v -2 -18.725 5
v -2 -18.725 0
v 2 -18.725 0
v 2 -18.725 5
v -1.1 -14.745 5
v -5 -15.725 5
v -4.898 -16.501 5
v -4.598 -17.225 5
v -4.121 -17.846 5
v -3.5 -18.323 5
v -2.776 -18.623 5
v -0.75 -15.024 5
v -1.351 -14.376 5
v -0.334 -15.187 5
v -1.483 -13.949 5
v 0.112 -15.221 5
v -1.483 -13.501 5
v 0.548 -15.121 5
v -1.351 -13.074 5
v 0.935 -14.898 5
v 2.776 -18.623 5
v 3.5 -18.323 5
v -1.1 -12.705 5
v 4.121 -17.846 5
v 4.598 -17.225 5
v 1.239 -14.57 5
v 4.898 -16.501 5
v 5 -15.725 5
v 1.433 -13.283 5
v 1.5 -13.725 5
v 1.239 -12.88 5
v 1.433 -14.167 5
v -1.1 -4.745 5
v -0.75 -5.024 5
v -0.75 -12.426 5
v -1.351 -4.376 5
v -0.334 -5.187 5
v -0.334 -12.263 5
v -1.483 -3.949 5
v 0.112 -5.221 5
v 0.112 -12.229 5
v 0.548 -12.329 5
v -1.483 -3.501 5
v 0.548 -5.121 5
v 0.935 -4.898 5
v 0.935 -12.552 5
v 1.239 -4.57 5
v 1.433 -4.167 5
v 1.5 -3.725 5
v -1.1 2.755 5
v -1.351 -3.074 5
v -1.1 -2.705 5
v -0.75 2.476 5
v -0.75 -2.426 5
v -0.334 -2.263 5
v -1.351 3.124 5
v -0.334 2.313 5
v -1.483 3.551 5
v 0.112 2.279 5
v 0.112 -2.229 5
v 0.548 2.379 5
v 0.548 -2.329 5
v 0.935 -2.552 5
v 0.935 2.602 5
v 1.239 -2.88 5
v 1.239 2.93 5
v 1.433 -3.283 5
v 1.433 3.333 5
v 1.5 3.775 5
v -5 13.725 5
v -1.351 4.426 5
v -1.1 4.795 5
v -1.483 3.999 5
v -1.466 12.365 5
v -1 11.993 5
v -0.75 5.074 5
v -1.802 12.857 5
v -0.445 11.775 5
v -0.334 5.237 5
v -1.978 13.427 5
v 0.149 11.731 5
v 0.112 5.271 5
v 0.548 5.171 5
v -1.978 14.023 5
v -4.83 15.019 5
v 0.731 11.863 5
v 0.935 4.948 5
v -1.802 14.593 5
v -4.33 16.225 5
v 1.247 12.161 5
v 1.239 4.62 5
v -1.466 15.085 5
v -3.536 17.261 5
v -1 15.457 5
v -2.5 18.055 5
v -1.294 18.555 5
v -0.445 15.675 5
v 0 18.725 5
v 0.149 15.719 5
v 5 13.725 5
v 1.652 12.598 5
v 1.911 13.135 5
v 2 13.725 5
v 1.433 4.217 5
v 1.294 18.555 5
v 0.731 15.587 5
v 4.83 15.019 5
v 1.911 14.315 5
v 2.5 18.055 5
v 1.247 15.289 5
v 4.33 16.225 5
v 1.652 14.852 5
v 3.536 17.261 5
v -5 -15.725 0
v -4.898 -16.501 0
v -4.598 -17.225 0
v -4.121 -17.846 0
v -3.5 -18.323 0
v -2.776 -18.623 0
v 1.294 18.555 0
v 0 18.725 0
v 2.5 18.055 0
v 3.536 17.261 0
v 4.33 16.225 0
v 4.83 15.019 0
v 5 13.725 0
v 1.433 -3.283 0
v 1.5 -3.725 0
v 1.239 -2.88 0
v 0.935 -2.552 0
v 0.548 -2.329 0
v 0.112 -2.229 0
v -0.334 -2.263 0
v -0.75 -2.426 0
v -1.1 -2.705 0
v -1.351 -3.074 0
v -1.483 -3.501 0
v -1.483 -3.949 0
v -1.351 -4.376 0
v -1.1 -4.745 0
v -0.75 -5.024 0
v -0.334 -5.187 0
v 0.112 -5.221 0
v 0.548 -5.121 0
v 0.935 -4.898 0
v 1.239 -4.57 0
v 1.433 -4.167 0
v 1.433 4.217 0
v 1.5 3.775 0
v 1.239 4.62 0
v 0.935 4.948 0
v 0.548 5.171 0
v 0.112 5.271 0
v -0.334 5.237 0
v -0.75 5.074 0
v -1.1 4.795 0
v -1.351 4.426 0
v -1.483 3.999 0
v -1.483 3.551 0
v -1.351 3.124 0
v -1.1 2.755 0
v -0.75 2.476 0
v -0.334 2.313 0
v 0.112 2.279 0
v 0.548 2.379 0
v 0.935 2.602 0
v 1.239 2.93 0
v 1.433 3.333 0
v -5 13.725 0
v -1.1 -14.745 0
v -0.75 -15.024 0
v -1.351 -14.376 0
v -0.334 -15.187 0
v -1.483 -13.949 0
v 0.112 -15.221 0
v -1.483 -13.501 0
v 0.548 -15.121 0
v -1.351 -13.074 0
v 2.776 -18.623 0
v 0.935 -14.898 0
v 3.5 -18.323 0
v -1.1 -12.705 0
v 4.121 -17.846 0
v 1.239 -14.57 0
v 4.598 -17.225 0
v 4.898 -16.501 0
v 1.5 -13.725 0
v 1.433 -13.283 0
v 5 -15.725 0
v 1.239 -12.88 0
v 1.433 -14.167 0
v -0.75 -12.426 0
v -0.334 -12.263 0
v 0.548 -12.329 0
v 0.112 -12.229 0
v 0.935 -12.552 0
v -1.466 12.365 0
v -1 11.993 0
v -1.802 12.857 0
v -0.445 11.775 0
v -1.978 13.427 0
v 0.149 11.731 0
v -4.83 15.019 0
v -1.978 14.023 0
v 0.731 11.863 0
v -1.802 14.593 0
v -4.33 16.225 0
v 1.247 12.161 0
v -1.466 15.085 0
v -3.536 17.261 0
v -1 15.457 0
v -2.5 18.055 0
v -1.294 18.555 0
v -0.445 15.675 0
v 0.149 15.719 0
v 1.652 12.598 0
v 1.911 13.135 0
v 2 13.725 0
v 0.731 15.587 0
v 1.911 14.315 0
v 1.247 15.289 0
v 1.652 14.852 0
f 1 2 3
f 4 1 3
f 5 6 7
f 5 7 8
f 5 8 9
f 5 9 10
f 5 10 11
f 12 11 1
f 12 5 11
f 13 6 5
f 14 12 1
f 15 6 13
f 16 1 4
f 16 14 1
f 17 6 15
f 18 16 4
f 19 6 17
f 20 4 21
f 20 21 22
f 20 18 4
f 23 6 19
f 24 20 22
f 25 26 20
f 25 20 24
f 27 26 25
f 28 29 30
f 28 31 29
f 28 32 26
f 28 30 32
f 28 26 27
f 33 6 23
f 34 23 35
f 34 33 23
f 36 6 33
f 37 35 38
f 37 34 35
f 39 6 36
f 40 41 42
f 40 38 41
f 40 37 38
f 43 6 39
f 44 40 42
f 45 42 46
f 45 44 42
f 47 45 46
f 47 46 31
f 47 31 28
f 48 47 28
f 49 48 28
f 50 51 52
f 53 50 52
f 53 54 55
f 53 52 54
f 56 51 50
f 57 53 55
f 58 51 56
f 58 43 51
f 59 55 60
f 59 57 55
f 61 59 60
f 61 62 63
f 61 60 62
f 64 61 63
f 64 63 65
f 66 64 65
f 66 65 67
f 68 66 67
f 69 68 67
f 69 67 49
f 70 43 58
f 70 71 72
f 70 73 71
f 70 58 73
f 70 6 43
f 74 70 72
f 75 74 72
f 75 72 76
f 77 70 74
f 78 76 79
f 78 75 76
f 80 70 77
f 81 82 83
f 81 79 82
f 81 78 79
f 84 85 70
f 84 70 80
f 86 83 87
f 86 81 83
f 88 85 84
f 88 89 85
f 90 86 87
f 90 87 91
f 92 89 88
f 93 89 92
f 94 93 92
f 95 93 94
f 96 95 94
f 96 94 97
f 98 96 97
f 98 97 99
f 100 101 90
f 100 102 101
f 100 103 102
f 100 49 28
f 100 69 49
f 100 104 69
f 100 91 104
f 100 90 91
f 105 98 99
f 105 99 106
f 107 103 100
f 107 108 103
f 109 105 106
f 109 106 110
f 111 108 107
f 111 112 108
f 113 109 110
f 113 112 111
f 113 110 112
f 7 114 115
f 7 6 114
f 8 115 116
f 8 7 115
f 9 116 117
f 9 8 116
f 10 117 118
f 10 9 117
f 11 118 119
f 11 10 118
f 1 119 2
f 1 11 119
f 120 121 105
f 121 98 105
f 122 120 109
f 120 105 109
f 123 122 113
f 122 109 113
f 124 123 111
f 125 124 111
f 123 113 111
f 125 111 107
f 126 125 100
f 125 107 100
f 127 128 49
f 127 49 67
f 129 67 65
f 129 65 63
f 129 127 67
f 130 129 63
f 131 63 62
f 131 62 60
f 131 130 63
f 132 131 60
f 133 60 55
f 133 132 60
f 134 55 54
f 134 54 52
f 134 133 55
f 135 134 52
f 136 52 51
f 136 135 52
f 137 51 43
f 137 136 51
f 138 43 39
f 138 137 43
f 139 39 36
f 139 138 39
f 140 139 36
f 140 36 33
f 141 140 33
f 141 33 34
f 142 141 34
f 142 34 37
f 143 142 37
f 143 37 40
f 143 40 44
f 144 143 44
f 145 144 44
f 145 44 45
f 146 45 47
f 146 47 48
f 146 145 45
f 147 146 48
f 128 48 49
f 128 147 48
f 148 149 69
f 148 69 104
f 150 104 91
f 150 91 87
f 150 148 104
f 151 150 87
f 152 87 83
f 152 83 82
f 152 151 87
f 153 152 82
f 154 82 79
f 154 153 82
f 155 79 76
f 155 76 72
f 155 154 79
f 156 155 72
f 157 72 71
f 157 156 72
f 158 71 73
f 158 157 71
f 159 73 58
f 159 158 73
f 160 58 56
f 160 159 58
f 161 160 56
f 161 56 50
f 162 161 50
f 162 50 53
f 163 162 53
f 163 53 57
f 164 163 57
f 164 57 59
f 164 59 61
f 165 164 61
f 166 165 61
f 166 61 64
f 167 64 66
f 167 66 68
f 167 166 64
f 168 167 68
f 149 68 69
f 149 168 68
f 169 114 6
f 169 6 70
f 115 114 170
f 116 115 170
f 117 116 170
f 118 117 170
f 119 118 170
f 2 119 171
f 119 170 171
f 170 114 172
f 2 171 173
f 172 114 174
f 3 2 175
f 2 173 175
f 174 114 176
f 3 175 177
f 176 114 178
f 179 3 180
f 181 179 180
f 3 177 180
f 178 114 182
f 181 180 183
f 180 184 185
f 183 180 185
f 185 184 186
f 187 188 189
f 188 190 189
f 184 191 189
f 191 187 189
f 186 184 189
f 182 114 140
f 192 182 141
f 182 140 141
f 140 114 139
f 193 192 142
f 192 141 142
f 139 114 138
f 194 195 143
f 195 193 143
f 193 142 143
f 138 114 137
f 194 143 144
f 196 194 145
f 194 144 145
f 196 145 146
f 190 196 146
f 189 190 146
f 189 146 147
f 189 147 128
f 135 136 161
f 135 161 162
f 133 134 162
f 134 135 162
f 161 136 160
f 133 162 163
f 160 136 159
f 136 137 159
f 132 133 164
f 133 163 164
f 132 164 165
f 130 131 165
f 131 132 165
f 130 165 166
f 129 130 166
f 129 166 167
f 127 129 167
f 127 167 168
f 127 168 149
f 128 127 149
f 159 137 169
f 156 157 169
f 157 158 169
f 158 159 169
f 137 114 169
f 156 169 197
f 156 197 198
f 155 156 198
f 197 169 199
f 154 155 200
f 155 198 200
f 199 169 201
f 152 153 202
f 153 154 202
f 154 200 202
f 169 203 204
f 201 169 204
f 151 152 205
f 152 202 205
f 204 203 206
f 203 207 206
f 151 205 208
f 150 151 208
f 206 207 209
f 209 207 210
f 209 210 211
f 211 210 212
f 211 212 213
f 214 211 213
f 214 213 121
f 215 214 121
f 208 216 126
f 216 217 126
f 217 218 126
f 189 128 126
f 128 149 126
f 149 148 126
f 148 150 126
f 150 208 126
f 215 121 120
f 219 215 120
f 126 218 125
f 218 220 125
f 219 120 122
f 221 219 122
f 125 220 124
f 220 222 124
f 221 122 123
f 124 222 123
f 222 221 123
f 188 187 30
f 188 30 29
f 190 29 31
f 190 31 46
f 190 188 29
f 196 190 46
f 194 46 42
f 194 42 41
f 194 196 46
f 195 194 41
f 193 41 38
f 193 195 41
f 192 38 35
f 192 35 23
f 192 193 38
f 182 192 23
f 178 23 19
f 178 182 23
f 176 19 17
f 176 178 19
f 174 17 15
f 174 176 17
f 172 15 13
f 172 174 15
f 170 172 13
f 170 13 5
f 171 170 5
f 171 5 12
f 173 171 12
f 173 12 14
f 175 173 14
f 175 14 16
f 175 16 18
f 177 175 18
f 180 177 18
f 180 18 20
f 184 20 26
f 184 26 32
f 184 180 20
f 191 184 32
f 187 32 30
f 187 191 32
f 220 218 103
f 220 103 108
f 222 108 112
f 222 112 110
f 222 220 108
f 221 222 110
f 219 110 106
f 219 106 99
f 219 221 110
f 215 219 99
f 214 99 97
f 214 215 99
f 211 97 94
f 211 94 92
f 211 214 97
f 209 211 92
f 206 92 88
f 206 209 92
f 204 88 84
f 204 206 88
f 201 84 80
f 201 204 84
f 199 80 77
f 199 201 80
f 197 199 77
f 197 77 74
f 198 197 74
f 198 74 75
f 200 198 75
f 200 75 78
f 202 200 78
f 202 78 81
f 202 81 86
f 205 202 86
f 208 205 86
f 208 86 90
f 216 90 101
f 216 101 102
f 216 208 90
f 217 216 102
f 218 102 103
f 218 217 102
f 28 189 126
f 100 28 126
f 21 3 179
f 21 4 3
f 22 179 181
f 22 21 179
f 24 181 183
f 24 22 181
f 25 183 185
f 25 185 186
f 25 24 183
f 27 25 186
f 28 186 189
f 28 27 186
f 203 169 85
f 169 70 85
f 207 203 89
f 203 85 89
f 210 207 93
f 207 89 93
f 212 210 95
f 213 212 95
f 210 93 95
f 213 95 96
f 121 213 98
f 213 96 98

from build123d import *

# Parameters (mm, degrees)
SKETCH_1_W      = 10
SKETCH_1_H      = 37.45
SKETCH_1_R      = 1.5
SKETCH_1_R_2    = 2
EXTRUDE_1_DEPTH = 5
FILLET_1_R      = 5
FILLET_2_R      = 3


with BuildPart() as part:
    # ｽｹｯﾁ1 → ﾎﾞｽ - 押し出し1 (new body)
    with BuildSketch(Plane.XY):
        Rectangle(SKETCH_1_W, SKETCH_1_H)
        with Locations((0, -13.725)):
            Circle(SKETCH_1_R, mode=Mode.SUBTRACT)
        with Locations((0, -3.725)):
            Circle(SKETCH_1_R, mode=Mode.SUBTRACT)
        with Locations((0, 13.725)):
            Circle(SKETCH_1_R_2, mode=Mode.SUBTRACT)
        with Locations((0, 3.775)):
            Circle(SKETCH_1_R, mode=Mode.SUBTRACT)
    extrude(amount=EXTRUDE_1_DEPTH)

    # ﾌｨﾚｯﾄ1
    fillet_1_edges = [part.edges().sort_by_distance(p)[0] for p in [
        (5, 18.725, 2.5),
        (-5, 18.725, 2.5),
    ]]
    fillet(fillet_1_edges, radius=FILLET_1_R - 0.0001)  # a hair under: the kernel refuses the full size

    # ﾌｨﾚｯﾄ2
    fillet_2_edges = [part.edges().sort_by_distance(p)[0] for p in [
        (5, -18.725, 2.5),
        (-5, -18.725, 2.5),
    ]]
    fillet(fillet_2_edges, radius=FILLET_2_R)


solid = part.part
